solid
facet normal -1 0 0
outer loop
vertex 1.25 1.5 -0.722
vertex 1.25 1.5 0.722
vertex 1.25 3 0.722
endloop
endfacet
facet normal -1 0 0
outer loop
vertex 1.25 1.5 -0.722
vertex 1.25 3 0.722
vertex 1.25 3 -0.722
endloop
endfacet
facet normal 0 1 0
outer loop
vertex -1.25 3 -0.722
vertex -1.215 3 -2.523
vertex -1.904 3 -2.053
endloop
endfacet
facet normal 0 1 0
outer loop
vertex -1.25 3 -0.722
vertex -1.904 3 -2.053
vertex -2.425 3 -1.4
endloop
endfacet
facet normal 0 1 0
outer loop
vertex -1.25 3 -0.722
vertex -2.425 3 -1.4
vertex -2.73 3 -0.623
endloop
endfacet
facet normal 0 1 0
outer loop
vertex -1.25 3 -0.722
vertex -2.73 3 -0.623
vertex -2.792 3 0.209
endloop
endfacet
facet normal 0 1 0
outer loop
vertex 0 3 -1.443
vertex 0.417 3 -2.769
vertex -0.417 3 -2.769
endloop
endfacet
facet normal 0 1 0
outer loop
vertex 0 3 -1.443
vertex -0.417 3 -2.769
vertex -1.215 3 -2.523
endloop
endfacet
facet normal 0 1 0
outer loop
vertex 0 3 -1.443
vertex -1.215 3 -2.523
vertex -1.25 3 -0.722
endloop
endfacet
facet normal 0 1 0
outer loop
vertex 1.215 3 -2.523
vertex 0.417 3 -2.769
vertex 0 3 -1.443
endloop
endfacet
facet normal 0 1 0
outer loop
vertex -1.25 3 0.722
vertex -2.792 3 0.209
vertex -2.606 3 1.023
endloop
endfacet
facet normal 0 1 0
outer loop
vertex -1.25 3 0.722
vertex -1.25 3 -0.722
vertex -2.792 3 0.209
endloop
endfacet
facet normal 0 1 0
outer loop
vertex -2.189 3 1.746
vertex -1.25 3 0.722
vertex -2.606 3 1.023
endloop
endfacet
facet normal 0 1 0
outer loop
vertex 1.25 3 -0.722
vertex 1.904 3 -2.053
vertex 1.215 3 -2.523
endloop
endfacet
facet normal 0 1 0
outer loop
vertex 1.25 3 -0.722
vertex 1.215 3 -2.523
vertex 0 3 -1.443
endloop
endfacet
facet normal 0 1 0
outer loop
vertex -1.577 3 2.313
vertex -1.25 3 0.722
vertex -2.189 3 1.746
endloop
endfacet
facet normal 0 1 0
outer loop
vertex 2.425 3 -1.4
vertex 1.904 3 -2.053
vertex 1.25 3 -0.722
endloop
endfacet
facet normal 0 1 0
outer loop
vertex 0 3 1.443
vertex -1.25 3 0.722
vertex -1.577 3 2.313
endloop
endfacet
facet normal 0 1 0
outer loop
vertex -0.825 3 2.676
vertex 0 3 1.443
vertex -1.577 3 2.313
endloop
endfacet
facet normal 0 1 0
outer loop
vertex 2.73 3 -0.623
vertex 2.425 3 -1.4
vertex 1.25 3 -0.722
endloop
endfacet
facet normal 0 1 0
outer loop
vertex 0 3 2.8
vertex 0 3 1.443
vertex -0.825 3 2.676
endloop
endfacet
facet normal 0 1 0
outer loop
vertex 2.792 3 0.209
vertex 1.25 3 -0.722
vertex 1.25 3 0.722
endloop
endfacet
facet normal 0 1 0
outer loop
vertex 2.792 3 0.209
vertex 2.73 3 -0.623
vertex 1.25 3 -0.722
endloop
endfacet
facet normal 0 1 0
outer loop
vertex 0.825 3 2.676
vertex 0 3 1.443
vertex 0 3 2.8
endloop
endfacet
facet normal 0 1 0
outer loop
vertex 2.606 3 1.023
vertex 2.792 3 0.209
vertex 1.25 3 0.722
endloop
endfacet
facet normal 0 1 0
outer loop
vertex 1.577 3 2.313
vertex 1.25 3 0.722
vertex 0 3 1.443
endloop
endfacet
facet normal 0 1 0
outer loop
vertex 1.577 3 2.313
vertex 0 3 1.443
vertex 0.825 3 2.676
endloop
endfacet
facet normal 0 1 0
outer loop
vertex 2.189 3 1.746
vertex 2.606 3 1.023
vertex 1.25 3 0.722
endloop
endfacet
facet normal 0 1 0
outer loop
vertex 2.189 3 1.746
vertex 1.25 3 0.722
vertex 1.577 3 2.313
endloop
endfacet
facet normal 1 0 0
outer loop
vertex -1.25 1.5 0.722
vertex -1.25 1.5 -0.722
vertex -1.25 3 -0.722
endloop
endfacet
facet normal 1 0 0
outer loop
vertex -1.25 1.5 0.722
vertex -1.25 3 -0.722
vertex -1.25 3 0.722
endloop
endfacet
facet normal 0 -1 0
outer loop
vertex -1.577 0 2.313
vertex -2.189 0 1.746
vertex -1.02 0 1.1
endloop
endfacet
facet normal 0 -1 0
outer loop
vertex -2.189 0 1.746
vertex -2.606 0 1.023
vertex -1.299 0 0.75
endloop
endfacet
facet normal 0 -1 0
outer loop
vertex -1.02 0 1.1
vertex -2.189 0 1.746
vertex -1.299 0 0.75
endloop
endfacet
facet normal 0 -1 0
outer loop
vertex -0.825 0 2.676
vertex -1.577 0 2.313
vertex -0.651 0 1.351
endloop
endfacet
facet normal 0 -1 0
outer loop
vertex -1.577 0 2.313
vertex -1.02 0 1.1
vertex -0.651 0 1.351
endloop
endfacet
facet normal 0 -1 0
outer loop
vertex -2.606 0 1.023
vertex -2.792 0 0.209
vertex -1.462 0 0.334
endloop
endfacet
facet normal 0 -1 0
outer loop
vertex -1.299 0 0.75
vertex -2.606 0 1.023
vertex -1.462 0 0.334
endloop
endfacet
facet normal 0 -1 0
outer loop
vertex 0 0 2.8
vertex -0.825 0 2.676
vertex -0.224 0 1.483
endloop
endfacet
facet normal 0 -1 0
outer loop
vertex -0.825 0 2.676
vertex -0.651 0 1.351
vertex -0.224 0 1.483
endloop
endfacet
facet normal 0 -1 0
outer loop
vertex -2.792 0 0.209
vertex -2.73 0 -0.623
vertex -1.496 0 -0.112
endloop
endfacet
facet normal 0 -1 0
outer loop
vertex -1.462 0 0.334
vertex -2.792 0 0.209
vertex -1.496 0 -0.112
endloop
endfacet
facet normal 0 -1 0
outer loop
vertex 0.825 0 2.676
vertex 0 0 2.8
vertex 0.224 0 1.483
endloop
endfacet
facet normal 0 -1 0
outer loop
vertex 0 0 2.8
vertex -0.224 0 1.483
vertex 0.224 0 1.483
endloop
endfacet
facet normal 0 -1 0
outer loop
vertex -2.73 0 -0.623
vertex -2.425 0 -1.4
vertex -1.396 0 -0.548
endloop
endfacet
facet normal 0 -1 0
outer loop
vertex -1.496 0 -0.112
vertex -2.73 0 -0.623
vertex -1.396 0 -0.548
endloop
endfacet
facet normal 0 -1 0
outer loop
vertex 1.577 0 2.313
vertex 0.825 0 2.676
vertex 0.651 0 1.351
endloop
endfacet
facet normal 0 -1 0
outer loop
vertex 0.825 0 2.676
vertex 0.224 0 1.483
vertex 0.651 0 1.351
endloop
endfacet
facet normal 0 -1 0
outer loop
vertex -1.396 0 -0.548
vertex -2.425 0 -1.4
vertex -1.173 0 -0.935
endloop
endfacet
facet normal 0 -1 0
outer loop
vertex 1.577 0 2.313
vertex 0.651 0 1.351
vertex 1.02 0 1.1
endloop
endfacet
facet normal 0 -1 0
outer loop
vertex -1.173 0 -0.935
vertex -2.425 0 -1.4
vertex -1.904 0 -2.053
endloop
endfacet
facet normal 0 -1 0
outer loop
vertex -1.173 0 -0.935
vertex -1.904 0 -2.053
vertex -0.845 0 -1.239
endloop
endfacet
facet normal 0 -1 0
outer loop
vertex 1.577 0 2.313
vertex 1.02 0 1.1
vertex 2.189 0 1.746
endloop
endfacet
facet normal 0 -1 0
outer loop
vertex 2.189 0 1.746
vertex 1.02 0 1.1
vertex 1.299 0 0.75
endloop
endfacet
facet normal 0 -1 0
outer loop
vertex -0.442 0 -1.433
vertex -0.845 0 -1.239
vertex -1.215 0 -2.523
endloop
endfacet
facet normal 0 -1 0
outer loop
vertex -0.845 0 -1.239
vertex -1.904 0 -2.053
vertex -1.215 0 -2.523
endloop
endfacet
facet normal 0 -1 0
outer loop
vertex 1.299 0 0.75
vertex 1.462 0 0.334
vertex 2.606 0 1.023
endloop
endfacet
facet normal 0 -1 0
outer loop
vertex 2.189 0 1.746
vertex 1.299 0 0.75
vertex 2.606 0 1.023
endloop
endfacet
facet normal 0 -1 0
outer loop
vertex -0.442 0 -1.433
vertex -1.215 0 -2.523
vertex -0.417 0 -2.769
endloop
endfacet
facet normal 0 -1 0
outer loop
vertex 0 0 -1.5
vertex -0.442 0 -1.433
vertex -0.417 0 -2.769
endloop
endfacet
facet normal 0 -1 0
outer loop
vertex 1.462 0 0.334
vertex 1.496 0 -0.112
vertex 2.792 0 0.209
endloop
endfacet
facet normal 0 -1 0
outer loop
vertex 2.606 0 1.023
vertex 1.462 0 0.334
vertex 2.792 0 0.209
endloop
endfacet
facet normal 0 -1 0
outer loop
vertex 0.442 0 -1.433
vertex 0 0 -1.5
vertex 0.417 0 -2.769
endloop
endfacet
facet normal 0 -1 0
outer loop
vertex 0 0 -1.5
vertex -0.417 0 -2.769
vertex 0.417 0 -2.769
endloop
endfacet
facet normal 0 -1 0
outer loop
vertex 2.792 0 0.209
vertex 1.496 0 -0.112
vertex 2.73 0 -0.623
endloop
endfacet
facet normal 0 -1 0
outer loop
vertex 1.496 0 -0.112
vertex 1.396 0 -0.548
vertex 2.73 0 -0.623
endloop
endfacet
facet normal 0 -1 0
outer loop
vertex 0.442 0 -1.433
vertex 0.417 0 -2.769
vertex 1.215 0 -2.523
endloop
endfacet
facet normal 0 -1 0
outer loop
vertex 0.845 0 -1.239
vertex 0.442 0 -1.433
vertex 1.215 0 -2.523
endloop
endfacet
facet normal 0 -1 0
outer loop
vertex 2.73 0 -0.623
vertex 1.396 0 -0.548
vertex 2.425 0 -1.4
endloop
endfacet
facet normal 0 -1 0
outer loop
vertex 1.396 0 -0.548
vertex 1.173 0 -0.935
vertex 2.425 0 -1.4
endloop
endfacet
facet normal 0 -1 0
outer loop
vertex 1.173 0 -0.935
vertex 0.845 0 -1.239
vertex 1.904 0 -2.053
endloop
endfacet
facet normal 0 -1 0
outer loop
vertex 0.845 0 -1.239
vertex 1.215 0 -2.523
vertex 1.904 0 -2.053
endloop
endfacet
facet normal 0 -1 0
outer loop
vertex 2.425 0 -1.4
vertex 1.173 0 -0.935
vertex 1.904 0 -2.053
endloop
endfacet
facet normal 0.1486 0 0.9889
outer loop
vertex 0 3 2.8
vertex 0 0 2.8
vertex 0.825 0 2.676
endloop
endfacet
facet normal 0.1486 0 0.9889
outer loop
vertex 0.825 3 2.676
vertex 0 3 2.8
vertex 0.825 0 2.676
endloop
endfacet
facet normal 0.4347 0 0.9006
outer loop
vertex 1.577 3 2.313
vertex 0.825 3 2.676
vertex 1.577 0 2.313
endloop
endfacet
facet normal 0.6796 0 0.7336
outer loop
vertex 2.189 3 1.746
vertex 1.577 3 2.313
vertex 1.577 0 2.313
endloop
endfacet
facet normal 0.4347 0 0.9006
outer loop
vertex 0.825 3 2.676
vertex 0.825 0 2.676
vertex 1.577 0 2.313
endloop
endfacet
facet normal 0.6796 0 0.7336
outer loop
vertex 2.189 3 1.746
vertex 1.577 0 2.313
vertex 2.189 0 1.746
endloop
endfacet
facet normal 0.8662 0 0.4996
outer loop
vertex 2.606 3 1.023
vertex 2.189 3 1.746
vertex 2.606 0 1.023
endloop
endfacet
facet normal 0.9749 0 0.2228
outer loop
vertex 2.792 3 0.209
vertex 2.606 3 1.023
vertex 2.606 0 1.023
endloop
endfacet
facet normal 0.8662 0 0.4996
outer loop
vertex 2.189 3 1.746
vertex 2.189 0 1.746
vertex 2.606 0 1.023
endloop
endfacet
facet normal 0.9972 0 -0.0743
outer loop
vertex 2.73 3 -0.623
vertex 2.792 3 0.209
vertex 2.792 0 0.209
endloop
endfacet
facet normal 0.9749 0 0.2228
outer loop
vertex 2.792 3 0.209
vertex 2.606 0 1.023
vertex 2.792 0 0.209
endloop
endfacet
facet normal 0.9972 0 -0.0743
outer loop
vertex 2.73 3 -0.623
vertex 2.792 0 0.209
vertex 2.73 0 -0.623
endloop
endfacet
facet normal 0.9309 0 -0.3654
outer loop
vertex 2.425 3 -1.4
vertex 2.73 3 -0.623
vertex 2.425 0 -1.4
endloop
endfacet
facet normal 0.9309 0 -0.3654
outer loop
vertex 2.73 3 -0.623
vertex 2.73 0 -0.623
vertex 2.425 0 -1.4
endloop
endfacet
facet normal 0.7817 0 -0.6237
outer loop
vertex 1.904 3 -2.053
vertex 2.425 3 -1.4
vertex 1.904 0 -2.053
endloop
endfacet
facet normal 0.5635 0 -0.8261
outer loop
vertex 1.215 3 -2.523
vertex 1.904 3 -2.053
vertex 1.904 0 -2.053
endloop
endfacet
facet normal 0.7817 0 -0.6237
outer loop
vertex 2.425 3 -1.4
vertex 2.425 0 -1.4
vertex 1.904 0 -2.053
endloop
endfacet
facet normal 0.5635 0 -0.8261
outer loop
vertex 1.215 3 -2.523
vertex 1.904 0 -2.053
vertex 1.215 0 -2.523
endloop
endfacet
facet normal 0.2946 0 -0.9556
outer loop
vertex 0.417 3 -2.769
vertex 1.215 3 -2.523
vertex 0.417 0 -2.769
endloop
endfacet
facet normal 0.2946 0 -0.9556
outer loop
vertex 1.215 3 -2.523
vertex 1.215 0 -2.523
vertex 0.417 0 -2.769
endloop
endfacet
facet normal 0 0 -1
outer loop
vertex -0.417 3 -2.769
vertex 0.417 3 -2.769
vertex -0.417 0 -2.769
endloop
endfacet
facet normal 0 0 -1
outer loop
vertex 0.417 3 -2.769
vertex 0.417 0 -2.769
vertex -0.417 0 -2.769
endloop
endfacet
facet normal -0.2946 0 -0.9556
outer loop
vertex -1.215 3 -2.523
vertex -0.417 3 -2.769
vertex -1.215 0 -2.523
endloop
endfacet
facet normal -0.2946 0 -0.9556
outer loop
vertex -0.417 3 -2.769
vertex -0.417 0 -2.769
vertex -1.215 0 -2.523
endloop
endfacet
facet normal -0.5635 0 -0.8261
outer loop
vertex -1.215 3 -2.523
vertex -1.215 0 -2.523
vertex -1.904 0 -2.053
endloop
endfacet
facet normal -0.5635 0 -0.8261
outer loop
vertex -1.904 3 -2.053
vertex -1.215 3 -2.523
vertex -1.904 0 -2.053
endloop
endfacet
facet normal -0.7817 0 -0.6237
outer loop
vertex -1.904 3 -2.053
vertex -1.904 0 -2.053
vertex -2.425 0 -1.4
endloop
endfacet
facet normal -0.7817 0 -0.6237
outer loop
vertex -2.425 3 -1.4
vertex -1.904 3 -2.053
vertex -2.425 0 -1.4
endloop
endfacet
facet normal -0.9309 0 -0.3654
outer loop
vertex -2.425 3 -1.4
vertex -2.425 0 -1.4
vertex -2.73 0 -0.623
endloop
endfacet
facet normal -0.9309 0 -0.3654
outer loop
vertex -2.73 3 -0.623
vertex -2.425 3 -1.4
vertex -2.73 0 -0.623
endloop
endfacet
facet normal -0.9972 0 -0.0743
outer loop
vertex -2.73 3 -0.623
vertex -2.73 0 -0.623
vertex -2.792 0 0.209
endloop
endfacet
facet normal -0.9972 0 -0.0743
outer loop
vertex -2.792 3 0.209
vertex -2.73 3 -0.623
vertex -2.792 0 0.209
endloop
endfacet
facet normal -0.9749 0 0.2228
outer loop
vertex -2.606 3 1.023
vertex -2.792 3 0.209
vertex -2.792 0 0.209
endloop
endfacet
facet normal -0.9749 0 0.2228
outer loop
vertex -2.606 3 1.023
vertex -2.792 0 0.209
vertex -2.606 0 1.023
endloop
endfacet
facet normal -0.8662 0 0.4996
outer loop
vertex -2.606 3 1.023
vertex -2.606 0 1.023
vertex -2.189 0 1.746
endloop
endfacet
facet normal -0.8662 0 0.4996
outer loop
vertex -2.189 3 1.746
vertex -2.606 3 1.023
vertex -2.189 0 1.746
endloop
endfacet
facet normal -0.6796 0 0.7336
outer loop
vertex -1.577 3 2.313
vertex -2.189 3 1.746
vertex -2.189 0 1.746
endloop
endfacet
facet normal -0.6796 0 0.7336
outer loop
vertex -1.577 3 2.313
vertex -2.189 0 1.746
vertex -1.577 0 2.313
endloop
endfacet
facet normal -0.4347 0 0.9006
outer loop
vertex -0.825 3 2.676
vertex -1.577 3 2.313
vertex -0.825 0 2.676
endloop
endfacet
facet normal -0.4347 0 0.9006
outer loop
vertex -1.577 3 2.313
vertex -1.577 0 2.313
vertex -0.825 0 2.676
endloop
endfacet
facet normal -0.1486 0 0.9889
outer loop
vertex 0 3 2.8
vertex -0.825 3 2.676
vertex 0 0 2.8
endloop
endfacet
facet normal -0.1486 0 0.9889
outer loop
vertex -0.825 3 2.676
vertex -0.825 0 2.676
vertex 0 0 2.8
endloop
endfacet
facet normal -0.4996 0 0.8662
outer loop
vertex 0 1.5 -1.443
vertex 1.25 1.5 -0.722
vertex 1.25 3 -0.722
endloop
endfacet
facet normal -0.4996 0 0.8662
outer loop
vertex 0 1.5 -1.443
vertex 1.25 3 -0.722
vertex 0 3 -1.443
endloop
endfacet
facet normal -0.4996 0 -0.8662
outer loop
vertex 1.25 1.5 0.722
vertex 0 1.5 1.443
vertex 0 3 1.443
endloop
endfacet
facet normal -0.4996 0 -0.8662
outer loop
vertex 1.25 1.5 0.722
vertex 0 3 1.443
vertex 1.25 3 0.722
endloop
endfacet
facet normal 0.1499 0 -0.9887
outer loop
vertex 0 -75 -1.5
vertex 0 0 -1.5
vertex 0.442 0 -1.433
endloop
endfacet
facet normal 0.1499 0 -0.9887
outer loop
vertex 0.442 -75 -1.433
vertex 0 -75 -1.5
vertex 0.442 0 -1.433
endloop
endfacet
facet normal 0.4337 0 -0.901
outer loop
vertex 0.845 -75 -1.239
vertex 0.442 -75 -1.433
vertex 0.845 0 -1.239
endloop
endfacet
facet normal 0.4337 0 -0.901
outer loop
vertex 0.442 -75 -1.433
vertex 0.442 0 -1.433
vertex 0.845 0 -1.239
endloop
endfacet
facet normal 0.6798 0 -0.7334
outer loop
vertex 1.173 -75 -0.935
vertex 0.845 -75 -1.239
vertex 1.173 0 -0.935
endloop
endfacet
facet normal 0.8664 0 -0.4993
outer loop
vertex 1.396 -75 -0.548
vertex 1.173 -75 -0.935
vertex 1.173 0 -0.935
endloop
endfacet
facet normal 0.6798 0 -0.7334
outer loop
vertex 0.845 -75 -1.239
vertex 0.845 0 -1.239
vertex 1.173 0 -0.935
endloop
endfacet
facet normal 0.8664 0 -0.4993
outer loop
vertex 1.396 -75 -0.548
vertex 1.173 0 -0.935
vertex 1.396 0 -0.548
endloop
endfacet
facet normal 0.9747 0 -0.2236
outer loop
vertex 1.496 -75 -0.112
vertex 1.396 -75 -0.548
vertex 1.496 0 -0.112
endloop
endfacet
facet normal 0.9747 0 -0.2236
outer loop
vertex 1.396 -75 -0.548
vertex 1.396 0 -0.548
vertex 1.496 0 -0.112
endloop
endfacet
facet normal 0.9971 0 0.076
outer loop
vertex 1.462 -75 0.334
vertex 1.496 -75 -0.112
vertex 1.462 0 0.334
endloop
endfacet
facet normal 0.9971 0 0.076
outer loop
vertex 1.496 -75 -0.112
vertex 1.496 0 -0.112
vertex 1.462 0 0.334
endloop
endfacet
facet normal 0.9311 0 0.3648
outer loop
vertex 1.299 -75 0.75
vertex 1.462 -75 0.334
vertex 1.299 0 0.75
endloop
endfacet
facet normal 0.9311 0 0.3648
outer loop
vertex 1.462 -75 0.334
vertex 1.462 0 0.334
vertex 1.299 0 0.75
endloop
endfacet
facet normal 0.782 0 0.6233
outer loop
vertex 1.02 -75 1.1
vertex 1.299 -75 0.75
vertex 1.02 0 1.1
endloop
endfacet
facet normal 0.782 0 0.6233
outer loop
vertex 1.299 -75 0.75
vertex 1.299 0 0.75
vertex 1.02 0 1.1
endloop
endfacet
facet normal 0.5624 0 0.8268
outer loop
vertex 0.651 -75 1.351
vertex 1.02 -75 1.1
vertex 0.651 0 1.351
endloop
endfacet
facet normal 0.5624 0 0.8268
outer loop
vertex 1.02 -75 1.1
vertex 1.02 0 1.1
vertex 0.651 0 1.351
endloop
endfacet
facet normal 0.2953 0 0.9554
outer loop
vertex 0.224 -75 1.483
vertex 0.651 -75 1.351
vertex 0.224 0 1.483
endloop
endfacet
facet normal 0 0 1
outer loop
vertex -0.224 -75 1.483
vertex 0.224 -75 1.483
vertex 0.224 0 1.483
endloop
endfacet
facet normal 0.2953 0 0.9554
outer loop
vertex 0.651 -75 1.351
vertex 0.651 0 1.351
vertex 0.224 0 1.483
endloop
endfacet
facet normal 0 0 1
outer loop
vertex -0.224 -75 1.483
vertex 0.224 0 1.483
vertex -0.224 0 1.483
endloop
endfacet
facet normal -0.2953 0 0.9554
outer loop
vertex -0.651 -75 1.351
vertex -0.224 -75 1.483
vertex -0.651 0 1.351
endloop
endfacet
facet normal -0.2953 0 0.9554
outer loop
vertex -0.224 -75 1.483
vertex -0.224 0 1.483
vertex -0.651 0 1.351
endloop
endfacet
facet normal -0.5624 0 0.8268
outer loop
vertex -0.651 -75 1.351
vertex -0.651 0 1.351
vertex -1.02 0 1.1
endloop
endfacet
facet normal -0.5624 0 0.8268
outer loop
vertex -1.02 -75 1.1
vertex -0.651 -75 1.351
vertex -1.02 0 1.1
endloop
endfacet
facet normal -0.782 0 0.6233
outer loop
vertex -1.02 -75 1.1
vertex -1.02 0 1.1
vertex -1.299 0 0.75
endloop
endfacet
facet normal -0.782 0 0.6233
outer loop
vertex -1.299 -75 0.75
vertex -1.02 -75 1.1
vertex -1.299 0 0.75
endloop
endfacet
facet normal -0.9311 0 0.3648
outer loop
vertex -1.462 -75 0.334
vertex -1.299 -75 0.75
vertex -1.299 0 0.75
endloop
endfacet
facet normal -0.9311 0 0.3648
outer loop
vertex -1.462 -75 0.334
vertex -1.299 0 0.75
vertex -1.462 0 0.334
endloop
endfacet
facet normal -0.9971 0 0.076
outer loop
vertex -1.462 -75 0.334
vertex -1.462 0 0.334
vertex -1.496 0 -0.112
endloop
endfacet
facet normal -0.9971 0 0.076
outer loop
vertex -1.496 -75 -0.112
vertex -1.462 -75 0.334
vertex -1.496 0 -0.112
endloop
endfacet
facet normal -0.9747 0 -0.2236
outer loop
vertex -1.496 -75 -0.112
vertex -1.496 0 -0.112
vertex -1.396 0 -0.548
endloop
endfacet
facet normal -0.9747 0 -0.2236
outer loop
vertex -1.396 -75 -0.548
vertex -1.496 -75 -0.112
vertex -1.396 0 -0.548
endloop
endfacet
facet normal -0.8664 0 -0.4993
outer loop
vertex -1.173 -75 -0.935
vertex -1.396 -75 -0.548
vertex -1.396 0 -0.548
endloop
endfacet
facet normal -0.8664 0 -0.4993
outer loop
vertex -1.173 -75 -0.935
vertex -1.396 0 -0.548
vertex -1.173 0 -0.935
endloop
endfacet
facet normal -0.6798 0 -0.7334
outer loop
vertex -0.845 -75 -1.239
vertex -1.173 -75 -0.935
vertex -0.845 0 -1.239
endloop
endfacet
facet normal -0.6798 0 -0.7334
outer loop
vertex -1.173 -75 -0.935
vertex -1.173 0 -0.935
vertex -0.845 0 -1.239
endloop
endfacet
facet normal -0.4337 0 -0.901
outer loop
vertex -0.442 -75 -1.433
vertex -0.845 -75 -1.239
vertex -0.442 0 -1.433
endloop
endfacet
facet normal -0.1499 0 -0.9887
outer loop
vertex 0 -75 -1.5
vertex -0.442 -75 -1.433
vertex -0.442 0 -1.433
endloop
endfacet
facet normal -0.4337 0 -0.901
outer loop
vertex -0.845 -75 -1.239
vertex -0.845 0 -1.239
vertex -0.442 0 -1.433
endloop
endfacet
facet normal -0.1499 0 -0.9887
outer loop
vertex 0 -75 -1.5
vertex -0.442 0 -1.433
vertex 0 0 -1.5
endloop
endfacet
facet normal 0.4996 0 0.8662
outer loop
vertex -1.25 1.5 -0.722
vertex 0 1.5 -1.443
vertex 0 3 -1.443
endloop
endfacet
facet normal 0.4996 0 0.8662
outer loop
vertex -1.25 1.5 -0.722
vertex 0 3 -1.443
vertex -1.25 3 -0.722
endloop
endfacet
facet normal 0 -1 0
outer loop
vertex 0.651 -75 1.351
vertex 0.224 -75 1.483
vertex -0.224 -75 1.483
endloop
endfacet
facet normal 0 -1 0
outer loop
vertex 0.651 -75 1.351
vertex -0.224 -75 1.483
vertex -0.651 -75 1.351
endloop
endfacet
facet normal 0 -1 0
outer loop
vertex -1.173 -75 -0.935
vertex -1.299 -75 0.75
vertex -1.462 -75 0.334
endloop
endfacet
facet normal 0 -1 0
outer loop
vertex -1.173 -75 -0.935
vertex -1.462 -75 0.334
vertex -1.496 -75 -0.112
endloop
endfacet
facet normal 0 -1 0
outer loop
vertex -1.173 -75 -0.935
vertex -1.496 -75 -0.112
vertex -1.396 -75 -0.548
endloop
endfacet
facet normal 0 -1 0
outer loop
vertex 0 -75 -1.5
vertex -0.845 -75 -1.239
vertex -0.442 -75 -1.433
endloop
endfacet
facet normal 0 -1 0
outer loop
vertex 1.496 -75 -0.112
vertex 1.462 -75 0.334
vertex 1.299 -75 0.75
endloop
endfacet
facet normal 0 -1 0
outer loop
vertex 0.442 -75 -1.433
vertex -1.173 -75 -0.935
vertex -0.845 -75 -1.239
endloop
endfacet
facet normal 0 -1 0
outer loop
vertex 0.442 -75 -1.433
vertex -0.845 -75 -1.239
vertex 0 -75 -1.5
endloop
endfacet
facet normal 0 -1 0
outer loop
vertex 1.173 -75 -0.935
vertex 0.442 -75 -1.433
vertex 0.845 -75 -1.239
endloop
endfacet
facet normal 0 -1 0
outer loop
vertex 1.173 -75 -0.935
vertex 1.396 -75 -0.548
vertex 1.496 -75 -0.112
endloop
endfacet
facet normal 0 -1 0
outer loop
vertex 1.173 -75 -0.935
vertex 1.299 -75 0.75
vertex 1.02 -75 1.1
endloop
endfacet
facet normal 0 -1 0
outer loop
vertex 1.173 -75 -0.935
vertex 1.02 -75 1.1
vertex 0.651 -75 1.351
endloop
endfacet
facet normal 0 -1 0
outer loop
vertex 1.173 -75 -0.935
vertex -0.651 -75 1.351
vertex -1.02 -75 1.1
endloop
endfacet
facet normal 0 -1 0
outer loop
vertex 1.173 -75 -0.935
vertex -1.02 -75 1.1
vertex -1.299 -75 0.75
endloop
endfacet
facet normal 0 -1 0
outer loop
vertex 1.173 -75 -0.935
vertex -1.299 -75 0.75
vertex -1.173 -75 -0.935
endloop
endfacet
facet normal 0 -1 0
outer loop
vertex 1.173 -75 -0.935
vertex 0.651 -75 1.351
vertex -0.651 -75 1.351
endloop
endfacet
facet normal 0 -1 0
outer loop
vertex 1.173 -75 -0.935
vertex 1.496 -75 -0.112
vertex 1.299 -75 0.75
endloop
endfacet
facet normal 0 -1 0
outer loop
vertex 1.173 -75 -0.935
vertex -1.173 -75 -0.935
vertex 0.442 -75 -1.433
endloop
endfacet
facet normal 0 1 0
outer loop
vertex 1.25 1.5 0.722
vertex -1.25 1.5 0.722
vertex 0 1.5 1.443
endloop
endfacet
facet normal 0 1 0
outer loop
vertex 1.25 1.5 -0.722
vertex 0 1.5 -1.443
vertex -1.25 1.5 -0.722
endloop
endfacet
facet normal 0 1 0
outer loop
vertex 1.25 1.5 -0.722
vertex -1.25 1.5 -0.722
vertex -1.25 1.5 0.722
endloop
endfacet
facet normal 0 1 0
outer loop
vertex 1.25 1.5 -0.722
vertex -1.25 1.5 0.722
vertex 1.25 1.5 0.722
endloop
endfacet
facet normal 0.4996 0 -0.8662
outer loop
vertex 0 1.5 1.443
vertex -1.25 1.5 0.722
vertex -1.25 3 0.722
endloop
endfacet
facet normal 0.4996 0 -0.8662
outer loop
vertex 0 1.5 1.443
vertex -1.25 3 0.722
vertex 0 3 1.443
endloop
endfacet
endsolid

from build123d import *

# Parameters (mm, degrees)
SKETCH_1_R      = 2.8
EXTRUDE_1_DEPTH = 3
EXTRUDE_2_DEPTH = 1.5
SKETCH_2_R      = 1.5
EXTRUDE_3_DEPTH = 75


with BuildPart() as part:
    # 草图1 → 凸台-拉伸1 (new body)
    with BuildSketch(Plane(origin=(0, 0, 0), x_dir=(1, 0, 0), z_dir=(0, 1, 0))):
        Circle(SKETCH_1_R)
        Polygon((1.25, -0.721687836), (1.25, 0.721687836), (0, 1.443375673), (-1.25, 0.721687836), (-1.25, -0.721687836), (0, -1.443375673), align=None, mode=Mode.SUBTRACT)
    extrude(amount=EXTRUDE_1_DEPTH)

    # 草图1<2> → 凸台-拉伸2 (add)
    with BuildSketch(Plane(origin=(0, 0, 0), x_dir=(1, 0, 0), z_dir=(0, 1, 0))):
        Polygon((0, -1.443375673), (1.25, -0.721687836), (1.25, 0.721687836), (0, 1.443375673), (-1.25, 0.721687836), (-1.25, -0.721687836), align=None)
    extrude(amount=EXTRUDE_2_DEPTH)

    # 草图2 → 凸台-拉伸3 (add)
    with BuildSketch(Plane.XZ):
        Circle(SKETCH_2_R)
    extrude(amount=EXTRUDE_3_DEPTH)


solid = part.part
